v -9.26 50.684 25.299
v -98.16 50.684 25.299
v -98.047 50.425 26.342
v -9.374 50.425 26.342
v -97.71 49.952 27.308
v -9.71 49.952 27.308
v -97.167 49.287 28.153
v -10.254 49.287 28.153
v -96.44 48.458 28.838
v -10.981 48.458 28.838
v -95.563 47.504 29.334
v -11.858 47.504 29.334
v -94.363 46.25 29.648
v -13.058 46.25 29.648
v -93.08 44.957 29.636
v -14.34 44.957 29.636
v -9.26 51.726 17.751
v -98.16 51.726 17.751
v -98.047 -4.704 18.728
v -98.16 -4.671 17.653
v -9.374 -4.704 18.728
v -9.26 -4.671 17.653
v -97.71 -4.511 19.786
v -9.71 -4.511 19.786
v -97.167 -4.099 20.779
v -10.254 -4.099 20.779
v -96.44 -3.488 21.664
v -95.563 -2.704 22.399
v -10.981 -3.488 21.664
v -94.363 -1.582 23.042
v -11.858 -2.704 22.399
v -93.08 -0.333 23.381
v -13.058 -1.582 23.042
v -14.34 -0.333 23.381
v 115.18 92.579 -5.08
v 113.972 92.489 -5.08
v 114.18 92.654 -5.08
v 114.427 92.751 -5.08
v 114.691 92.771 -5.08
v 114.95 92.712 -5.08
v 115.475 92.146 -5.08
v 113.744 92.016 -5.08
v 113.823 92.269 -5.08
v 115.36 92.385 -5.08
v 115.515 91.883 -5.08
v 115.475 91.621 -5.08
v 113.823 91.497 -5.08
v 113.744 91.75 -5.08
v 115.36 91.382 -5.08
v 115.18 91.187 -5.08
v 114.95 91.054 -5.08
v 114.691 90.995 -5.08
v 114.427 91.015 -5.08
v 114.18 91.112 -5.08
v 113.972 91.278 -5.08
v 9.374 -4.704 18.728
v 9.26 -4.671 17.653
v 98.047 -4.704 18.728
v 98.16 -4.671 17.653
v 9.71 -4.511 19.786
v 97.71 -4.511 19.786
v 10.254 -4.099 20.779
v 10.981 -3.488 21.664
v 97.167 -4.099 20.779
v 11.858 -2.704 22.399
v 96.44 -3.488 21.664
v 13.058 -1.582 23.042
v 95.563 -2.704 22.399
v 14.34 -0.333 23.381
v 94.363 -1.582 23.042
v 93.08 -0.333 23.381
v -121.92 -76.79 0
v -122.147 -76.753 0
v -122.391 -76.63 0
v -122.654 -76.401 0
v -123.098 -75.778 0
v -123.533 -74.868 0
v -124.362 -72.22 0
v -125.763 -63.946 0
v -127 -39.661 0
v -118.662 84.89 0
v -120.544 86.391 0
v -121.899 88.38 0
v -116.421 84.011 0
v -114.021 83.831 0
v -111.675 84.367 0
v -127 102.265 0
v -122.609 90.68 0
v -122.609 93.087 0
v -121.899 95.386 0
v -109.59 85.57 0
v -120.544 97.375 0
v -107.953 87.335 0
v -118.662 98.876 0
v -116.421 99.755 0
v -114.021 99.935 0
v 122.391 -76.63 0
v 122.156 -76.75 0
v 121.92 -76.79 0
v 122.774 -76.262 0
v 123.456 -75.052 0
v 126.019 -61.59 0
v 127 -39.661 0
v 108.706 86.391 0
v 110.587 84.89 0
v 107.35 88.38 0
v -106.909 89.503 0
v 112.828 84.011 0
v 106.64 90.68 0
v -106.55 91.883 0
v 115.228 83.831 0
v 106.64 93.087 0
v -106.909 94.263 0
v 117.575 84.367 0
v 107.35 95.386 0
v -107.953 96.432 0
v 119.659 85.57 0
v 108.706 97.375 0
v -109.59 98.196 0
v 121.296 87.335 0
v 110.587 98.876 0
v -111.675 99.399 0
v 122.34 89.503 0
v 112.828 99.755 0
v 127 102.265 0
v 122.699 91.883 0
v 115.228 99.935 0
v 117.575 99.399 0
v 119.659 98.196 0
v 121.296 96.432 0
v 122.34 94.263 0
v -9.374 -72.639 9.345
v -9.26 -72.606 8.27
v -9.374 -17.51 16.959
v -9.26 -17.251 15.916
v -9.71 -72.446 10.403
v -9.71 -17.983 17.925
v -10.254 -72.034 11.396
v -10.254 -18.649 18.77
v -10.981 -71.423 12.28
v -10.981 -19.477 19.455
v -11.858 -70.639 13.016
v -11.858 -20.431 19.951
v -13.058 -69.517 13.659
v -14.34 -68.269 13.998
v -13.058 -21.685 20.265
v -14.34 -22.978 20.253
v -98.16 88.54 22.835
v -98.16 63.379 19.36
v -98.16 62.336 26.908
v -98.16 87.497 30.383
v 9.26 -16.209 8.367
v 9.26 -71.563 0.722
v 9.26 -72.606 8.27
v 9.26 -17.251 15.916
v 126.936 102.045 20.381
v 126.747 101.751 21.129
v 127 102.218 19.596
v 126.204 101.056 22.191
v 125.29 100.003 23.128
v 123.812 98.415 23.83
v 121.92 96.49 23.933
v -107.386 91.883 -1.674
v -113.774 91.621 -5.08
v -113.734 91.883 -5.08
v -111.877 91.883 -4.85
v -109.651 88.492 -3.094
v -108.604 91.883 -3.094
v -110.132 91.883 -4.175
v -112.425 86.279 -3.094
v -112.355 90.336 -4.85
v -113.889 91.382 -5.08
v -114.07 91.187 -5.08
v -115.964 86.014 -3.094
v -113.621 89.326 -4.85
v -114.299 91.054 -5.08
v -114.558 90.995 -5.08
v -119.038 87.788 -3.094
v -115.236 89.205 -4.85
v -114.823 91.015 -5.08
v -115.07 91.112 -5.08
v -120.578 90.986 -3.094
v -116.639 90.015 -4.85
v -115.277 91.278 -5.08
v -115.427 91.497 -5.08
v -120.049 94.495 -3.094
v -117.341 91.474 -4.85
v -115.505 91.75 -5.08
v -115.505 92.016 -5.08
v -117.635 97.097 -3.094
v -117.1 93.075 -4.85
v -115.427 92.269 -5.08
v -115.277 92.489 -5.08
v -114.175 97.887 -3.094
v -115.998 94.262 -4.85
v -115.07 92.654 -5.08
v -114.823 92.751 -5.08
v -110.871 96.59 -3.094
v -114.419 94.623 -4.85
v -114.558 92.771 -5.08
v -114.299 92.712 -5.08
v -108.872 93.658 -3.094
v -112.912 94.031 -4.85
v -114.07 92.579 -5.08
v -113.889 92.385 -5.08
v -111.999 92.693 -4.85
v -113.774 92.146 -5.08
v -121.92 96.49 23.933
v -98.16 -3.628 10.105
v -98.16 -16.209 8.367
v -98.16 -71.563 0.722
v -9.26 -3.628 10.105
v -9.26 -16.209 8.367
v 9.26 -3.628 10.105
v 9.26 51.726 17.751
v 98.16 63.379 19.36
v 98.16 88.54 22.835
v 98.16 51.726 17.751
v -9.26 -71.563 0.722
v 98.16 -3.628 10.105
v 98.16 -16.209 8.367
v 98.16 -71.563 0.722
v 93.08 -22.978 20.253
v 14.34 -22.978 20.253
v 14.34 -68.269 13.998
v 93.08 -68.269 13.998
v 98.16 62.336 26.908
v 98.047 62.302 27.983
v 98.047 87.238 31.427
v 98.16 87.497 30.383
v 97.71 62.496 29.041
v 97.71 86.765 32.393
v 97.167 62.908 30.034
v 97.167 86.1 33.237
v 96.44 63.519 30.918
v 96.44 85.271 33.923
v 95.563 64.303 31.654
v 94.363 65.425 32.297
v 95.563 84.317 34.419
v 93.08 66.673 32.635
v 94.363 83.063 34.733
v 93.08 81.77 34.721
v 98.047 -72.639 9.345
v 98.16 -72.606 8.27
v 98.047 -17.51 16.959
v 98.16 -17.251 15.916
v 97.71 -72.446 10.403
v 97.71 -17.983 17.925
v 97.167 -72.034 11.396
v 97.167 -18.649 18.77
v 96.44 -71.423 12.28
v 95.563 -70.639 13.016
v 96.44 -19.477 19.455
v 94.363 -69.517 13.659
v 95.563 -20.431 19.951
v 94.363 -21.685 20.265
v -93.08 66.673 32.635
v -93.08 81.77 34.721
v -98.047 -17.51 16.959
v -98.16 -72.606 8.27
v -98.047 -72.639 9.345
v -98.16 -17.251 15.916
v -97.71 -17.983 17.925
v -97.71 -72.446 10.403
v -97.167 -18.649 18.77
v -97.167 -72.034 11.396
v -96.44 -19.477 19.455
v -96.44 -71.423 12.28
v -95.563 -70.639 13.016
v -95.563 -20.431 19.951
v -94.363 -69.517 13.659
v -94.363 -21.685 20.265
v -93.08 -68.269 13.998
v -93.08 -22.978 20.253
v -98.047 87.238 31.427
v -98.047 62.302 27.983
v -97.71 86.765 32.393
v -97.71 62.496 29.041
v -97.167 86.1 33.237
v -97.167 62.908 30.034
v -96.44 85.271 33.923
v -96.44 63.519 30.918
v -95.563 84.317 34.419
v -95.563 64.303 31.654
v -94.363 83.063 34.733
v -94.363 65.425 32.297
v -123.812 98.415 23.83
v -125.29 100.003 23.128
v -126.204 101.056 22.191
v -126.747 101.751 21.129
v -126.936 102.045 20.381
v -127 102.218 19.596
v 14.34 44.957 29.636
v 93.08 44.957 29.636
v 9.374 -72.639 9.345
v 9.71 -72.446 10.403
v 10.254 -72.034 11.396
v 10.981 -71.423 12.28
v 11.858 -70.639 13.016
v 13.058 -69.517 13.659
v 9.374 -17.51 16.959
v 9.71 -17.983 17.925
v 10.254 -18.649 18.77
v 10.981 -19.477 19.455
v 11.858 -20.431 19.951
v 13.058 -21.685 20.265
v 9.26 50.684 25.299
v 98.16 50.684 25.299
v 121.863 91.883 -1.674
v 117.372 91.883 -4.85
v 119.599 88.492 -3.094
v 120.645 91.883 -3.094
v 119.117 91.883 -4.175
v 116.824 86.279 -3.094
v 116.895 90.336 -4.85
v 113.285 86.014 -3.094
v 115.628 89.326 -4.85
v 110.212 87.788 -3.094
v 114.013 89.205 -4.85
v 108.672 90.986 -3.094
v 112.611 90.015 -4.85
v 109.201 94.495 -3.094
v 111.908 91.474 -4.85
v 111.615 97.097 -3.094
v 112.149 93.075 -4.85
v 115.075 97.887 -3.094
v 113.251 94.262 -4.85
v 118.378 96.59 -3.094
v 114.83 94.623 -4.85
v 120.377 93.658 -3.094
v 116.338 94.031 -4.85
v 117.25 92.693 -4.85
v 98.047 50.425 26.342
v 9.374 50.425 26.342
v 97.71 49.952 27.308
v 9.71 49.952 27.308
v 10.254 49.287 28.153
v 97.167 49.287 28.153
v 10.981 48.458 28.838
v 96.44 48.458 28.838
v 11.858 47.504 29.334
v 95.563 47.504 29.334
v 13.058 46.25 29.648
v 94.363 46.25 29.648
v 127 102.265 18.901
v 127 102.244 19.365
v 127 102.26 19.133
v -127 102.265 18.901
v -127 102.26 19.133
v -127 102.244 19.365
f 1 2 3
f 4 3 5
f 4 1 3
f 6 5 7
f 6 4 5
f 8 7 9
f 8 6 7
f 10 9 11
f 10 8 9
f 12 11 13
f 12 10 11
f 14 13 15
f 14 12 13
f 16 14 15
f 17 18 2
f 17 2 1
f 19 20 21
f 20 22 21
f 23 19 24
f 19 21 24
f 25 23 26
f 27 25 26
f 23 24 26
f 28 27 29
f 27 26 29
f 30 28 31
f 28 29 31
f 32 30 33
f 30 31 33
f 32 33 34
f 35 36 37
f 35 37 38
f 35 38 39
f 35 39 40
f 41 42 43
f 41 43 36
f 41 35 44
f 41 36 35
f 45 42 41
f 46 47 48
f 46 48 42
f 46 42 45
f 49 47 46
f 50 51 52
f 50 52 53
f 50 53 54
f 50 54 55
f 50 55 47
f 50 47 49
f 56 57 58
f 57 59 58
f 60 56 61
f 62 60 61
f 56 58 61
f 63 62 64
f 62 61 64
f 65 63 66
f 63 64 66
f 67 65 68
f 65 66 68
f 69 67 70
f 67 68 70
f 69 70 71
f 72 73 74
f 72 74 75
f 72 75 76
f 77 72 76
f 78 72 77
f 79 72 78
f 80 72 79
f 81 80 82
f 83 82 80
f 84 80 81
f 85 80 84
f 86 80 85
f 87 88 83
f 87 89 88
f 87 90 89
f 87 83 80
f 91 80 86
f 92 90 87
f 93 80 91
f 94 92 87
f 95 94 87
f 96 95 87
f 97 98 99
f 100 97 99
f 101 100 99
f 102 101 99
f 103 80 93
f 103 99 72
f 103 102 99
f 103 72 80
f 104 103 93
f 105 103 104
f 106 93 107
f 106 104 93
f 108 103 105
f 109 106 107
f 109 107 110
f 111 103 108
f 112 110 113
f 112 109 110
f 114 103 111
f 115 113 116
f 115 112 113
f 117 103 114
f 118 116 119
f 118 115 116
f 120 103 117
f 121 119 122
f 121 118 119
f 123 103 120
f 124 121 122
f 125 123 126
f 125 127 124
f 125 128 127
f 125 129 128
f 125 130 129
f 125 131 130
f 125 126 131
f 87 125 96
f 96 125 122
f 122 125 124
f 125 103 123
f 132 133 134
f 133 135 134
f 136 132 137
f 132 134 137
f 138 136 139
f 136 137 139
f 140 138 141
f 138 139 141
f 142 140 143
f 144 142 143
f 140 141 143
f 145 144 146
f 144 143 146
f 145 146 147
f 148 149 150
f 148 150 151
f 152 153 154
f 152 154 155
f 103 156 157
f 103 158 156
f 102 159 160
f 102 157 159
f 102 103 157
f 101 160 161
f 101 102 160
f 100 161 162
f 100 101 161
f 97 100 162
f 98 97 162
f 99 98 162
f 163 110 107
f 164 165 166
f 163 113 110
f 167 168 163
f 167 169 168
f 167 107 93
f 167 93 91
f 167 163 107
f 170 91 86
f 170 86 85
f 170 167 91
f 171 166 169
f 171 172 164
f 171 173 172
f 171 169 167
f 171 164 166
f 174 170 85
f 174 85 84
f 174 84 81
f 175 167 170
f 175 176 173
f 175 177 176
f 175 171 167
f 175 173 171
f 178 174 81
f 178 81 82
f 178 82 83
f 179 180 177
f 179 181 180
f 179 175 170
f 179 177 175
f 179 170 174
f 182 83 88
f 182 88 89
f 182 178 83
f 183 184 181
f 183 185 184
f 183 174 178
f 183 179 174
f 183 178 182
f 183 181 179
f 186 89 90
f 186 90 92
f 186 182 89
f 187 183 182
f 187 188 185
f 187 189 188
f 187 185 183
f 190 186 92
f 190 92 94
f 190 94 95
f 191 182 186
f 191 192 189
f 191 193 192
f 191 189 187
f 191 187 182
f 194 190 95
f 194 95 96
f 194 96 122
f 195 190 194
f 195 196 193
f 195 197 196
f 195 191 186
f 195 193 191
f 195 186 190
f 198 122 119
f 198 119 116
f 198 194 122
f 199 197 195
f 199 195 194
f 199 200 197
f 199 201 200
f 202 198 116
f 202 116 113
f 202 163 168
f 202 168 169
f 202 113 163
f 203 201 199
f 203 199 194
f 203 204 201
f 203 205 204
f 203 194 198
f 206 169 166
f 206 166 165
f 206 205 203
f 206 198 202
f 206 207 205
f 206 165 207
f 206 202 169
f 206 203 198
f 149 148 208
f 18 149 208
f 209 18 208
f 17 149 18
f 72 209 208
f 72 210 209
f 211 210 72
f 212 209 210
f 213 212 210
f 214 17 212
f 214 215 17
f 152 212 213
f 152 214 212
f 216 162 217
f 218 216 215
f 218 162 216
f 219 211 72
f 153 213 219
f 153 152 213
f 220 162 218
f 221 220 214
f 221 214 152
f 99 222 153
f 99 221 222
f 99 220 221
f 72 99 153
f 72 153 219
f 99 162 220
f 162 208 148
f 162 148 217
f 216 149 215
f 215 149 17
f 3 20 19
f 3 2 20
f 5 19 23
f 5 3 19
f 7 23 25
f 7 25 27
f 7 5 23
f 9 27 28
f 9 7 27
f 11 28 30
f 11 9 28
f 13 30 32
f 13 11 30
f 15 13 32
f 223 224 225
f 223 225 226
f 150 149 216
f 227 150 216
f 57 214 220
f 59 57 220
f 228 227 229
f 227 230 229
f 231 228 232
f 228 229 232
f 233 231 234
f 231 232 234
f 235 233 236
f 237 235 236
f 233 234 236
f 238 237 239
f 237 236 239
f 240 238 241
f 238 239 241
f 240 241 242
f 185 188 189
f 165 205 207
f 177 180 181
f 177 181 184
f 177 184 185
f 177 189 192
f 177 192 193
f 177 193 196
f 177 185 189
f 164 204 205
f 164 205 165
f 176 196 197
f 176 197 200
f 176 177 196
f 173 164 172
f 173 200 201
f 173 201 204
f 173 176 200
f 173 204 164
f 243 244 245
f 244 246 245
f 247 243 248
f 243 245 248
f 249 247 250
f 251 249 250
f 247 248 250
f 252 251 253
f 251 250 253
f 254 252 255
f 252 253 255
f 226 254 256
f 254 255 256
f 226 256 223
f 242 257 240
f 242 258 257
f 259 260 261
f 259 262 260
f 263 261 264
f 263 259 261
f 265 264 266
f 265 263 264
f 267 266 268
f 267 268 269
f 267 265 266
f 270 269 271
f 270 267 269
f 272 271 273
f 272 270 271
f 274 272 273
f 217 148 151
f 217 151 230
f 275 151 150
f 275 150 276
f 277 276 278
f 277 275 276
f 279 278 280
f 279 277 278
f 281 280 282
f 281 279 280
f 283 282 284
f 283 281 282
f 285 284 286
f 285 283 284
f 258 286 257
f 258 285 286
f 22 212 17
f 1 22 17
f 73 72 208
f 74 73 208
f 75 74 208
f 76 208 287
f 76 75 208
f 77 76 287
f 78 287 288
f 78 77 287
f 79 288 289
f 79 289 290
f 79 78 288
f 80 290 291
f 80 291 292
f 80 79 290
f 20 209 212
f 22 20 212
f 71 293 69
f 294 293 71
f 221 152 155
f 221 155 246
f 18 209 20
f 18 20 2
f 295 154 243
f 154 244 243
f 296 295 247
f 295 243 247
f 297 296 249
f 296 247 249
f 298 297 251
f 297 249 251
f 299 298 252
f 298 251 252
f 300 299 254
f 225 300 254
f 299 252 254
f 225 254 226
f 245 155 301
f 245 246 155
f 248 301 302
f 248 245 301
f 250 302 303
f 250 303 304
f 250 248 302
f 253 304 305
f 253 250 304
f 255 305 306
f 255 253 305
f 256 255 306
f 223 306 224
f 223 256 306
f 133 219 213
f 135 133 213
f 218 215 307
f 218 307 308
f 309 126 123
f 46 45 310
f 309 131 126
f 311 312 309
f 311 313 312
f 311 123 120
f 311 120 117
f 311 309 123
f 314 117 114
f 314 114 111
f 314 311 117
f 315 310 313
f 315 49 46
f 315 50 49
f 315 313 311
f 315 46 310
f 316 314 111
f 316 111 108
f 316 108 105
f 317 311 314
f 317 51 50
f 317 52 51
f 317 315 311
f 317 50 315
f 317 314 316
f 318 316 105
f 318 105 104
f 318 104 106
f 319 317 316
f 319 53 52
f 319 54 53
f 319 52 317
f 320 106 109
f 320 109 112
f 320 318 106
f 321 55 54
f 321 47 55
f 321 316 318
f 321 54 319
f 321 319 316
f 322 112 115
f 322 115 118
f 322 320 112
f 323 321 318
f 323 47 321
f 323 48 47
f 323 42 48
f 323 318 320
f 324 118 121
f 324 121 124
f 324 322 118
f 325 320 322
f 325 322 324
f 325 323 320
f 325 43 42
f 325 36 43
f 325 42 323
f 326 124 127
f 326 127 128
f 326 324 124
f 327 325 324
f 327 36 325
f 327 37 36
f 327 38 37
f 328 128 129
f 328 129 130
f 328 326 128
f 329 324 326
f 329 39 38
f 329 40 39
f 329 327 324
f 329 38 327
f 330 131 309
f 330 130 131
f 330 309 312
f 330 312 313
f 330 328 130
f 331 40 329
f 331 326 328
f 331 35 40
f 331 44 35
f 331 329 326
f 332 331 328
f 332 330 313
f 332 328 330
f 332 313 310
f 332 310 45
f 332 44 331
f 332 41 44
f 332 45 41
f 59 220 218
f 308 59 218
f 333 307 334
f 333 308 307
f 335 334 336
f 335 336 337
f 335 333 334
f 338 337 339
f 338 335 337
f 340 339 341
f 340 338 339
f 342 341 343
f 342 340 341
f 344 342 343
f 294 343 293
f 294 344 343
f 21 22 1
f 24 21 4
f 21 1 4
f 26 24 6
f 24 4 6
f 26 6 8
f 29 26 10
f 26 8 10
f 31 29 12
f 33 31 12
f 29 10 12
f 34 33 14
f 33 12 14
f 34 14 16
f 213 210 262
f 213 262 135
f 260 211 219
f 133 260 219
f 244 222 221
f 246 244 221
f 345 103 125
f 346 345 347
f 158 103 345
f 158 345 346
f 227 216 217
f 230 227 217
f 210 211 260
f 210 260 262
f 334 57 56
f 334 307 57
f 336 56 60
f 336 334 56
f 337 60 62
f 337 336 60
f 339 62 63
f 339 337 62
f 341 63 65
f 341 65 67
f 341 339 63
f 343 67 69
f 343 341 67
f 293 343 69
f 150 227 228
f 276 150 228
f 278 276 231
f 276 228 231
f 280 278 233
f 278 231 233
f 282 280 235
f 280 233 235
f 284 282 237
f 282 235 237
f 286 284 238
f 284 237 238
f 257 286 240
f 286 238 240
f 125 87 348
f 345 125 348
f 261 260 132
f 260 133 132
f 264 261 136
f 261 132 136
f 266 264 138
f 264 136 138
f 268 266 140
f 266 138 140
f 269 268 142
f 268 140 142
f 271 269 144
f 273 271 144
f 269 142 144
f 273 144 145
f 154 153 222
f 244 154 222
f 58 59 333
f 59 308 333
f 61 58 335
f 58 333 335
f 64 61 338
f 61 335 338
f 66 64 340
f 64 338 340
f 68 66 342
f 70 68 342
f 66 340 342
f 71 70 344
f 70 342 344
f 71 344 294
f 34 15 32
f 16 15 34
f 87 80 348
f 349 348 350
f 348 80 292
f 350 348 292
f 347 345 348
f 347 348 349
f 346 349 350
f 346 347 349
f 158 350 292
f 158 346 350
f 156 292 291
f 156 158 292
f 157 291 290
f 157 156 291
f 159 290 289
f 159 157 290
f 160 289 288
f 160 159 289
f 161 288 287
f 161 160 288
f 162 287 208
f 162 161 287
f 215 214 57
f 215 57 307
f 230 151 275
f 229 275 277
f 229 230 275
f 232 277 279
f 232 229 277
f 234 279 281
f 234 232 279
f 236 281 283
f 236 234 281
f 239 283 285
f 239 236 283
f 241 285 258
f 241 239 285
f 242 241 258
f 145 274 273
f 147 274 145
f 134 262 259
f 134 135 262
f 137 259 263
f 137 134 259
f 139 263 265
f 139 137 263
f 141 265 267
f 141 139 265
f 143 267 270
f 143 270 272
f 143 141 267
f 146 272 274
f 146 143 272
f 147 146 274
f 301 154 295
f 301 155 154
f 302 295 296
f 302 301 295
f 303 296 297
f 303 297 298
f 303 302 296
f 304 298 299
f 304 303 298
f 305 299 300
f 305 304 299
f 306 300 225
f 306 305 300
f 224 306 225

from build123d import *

# Parameters (mm, degrees)
F1_DEPTH  = 127
F2_R      = 5.08
F3_W      = 88.9
F3_H      = 55.88
F4_DEPTH  = 12.7
F5_R      = 5.08
F6_W      = 196.3208343999
F6_H      = 25.4
F7_DEPTH  = 12.7
F8_R      = 5.08
F9_R      = 8.0743885719
F10_DEPTH = 5.08


# Not quite as in the source:
# - a fillet or chamfer that OpenCascade refuses, or shapes differently, is made with other operations: its cross-section is extruded or revolved along the edge and cut away or added


with BuildPart() as f1:
    # F0 (on Right) → F1 (new body, symmetric)
    with BuildSketch(Plane.YZ):
        Polygon((102.2654771805, 0), (102.2654771805, 24.730855599), (-76.7904296517, 0), align=None)
    extrude(amount=F1_DEPTH, both=True)

    # F2
    f2_edges = [f1.edges().sort_by_distance(p)[0] for p in [
        (-127, 12.737524, 12.365428),
        (127, 12.737524, 12.365428),
        (0, 102.265477, 24.730856),
    ]]
    fillet(f2_edges, radius=F2_R)

    # F3 (on face) → F4 (join)
    with BuildSketch(Plane(origin=(0, -1.4374781315, 10.4076039488), x_dir=(1, 0, 0), z_dir=(0, -0.1368192087, 0.9905960348))):
        with Locations((-53.7104171999, 25.7286139321)):
            Rectangle(F3_W, F3_H)
        with Locations((53.7104171999, 25.7286139321)):
            Rectangle(F3_W, F3_H)
        with Locations((53.7104171999, -42.8513860679)):
            Rectangle(F3_W, F3_H)
        with Locations((-53.7104171999, -42.8513860679)):
            Rectangle(F3_W, F3_H)
    extrude(amount=F4_DEPTH)

    # F5
    f5_edges = [f1.edges().sort_by_distance(p)[0] for p in [
        (-98.160417, 22.311581, 26.508342),
        (-53.710417, -5.365672, 22.685613),
        (-98.160417, -45.623495, 17.125281),
        (-53.710417, -73.300748, 13.302552),
        (-53.710417, -17.946242, 20.94801),
        (-9.260417, -45.623495, 17.125281),
        (53.710417, -5.365672, 22.685613),
        (9.260417, 22.311581, 26.508342),
        (53.710417, 49.988834, 30.331071),
        (98.160417, 22.311581, 26.508342),
        (53.710417, -17.946242, 20.94801),
        (9.260417, -45.623495, 17.125281),
        (53.710417, -73.300748, 13.302552),
        (98.160417, -45.623495, 17.125281),
        (-9.260417, 22.311581, 26.508342),
        (-53.710417, 49.988834, 30.331071),
    ]]
    fillet(f5_edges, radius=F5_R)

    # F6 (on face) → F7 (join)
    with BuildSketch(Plane(origin=(0, -1.4374781315, 10.4076039488), x_dir=(1, 0, 0), z_dir=(0, -0.1368192087, 0.9905960348))):
        with Locations((0, 78.1313713312)):
            Rectangle(F6_W, F6_H)
    extrude(amount=F7_DEPTH)

    # F8
    f8_edges = [f1.edges().sort_by_distance(p)[0] for p in [
        (0, 61.640975, 31.940442),
        (0, 86.802114, 35.41565),
        (98.160417, 74.221545, 33.678046),
        (-98.160417, 74.221545, 33.678046),
    ]]
    fillet(f8_edges, radius=F8_R)

    # F9 (on face) → F10 (join)
    with BuildSketch(Plane(origin=(0, 0, 0), x_dir=(1, 0, 0), z_dir=(0, 0, -1))):
        with Locations((-114.6246567369, -91.883122921)):
            Circle(F9_R)
        with Locations((114.6246567369, -91.883122921)):
            Circle(F9_R)
    extrude(amount=F10_DEPTH)

    # F11: fillet of radius 7.62 on 2 edges, made by hand

    # F11_s1 → F11_t2 (revolve, cut)
    with BuildSketch(Plane.XZ.offset(-91.883122921)):
        with BuildLine():
            ThreePointArc((122.6990453088, 0), (119.9142494631, -3.6817039467), (115.5148404119, -5.08))
            Line((115.5148404119, -5.08), (122.6990453088, -5.08))
            Line((122.6990453088, -5.08), (122.6990453088, 0))
        make_face()
    revolve(axis=Axis((114.6246567369, 91.883122921, -5.08), (0, 0, -1)), mode=Mode.SUBTRACT)

    # F11_s3 → F11_t4 (revolve, cut)
    with BuildSketch(Plane.XZ.offset(-91.883122921)):
        with BuildLine():
            ThreePointArc((-106.5502681649, 0), (-109.3350640106, -3.6817039467), (-113.7344730618, -5.08))
            Line((-113.7344730618, -5.08), (-106.5502681649, -5.08))
            Line((-106.5502681649, -5.08), (-106.5502681649, 0))
        make_face()
    revolve(axis=Axis((-114.6246567369, 91.883122921, -5.08), (0, 0, -1)), mode=Mode.SUBTRACT)


solid = f1.part
